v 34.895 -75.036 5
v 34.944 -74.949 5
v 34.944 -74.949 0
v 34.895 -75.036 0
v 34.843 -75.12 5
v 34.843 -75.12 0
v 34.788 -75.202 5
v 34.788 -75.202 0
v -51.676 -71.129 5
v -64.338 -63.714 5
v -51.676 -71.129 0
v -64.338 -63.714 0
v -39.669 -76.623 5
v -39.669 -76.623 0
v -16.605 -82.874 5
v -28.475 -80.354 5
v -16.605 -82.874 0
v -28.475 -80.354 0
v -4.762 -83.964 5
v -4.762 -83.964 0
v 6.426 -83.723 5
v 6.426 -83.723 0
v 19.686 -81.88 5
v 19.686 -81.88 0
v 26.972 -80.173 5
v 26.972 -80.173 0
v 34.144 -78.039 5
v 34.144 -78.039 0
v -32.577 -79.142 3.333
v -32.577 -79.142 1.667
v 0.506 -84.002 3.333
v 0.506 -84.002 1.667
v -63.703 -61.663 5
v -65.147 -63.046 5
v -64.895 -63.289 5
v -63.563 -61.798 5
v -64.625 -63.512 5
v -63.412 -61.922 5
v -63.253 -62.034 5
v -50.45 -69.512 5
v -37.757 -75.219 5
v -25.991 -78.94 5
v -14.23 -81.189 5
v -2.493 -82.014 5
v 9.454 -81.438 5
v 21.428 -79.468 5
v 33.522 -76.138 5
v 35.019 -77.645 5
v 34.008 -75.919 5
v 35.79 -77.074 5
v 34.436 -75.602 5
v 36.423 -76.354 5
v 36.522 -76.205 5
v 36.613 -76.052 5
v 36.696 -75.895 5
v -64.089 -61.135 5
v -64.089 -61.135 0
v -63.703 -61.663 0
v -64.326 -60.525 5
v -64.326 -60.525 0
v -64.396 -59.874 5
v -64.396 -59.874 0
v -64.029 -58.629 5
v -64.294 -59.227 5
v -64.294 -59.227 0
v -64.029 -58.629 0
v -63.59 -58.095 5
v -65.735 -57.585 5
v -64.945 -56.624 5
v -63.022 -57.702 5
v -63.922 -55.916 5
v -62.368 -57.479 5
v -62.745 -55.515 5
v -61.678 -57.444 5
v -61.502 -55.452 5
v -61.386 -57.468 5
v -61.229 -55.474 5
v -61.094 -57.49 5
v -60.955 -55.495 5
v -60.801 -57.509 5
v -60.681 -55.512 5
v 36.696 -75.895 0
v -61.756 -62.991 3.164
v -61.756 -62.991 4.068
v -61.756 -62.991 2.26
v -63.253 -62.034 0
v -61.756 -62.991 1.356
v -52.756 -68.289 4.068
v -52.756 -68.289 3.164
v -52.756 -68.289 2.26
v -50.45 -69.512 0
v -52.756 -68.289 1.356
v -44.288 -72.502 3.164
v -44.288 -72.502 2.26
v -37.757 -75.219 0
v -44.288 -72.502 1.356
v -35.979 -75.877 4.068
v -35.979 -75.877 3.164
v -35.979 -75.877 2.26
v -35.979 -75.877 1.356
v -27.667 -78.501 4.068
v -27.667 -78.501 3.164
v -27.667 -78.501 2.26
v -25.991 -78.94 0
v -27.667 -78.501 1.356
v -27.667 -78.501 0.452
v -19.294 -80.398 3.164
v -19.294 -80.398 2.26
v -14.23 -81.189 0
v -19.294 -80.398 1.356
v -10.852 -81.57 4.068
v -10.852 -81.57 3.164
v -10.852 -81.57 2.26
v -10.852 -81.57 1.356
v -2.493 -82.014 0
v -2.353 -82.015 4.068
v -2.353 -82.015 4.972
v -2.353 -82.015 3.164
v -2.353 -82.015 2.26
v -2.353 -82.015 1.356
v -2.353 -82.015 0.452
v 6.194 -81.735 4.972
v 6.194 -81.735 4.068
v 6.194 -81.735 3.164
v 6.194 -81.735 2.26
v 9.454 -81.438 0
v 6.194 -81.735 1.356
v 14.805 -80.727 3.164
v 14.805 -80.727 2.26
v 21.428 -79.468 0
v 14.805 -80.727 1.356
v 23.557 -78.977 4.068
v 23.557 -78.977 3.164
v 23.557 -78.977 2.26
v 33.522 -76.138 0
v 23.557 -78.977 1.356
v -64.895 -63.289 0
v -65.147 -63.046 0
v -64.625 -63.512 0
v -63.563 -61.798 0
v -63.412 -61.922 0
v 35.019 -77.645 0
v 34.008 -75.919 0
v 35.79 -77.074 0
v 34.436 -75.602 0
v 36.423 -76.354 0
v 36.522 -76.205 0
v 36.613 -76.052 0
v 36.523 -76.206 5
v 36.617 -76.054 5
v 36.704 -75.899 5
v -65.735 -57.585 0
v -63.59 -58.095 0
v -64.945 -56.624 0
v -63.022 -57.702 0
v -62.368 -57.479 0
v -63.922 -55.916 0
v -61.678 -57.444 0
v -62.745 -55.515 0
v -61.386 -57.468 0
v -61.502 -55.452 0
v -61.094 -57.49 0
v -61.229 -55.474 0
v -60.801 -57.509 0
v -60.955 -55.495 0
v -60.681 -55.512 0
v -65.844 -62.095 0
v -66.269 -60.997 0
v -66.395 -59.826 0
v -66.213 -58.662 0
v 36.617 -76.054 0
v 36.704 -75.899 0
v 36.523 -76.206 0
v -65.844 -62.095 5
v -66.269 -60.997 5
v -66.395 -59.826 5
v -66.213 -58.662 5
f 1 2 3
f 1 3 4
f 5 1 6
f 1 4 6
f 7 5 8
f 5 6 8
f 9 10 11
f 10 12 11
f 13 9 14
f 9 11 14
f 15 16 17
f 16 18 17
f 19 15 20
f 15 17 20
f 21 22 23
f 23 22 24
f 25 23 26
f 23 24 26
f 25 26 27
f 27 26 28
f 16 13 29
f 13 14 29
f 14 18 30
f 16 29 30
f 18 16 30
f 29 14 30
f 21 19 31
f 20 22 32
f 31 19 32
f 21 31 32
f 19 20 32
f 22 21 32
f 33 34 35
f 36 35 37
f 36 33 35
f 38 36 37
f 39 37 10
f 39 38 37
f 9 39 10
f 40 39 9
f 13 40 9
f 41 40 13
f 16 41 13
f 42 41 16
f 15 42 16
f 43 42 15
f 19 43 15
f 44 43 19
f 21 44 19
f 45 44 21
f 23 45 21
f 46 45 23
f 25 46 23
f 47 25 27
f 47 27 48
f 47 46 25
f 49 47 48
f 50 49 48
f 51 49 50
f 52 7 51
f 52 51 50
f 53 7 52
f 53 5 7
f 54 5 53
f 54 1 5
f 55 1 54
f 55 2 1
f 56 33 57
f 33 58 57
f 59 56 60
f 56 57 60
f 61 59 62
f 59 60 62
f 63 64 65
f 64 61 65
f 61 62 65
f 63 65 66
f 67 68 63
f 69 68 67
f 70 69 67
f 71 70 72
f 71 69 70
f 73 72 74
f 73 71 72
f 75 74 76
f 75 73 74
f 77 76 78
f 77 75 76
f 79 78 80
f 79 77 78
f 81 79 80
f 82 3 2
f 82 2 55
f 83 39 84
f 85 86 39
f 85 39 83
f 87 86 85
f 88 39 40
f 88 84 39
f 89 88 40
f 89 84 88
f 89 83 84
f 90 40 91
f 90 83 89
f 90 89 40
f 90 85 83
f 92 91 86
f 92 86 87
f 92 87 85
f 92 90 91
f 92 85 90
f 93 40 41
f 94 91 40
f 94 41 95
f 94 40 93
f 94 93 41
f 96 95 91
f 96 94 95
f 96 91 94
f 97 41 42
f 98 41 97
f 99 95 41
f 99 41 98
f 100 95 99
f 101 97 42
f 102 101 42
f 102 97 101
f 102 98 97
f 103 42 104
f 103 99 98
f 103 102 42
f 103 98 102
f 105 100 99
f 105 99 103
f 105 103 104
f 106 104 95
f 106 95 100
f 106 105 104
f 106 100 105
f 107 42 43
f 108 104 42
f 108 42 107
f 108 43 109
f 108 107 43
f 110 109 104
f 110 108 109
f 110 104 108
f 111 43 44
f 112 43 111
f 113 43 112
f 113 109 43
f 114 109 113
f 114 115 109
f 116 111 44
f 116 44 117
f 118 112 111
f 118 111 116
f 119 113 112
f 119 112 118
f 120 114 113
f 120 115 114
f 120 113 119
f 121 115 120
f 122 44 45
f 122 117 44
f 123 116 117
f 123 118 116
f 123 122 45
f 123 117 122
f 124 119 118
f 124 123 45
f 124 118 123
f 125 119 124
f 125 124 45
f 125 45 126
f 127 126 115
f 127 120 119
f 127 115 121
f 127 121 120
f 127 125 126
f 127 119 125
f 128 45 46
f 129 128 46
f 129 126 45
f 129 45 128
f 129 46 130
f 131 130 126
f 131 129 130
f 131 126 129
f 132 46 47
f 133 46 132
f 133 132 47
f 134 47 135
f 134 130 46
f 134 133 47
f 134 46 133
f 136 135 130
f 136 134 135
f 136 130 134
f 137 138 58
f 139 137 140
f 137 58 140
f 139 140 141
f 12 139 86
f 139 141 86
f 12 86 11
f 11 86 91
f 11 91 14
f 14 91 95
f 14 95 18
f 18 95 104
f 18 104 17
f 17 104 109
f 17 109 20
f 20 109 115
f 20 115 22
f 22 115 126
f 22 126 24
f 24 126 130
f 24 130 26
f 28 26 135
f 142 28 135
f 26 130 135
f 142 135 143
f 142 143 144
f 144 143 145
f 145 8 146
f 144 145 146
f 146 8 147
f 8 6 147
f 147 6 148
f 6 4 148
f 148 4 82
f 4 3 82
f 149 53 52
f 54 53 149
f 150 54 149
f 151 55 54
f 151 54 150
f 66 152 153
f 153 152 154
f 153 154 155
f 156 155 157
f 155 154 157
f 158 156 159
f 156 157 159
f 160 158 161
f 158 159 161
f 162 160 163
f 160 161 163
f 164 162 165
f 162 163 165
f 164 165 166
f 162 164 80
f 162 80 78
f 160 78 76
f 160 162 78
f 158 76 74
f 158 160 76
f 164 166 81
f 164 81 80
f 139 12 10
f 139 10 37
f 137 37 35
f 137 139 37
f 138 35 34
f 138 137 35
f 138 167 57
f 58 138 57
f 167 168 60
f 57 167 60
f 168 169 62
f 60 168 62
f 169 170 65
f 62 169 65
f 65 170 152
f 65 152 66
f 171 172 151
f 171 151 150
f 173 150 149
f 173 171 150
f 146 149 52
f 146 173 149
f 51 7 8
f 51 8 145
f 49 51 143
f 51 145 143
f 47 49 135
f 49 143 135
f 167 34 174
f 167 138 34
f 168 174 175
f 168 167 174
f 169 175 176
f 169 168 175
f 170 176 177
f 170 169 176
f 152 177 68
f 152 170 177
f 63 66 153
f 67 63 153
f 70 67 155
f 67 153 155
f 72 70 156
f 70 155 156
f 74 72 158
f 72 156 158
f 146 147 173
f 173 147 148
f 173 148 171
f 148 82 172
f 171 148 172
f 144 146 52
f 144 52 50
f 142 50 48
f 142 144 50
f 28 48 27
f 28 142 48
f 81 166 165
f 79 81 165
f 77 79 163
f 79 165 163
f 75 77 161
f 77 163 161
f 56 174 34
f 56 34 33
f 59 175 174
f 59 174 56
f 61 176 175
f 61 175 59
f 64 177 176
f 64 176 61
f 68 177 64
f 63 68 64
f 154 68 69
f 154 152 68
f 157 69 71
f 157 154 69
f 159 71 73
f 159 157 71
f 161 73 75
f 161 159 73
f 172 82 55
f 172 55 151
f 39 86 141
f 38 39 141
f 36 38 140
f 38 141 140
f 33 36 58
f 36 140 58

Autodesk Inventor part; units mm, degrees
ref_plane "YZ Plane" through (0, 0, 0) normal (1, 0, 0) x (0, 1, 0)
ref_plane "XZ Plane" through (0, 0, 0) normal (0, 1, 0) x (-1, 0, 0)
ref_plane "XY Plane" through (0, 0, 0) normal (0, 0, 1) x (1, 0, 0)
sketch "スケッチ1" plane through (0, 0, 0) normal (0, 0, 1) x (1, 0, 0)
  circle A0 centre (0, -30) radius 22.5
  arc A1 (33.5221, -76.1381) -> (34.7879, -75.2018) centre (32.744, -73.7622) ccw
  arc A2 (25.323, -41.3574) -> (34.2025, -71.7318) centre (49.1917, -50.8648) ccw
  arc A3 (25.323, -41.3574) -> (17.6049, -10.4152) centre (-0.0473, -31.252) ccw
  arc A4 (17.6049, -10.4152) -> (7.2408, -4.7162) centre (-0.2944, -30.6931) ccw
  arc A5 (5.1078, -1.4883) -> (7.2408, -4.7162) centre (8.0549, -1.8596) ccw
  arc A6 (5.1078, -1.4883) -> (-5.8369, -1.4852) centre (-0.3643, -0.7018) ccw
  arc A7 (-5.8369, -1.4852) -> (-5.7215, -2.051) centre (-0.3936, -0.6703) ccw
  arc A8 (-7.4636, -3.4089) -> (-5.7215, -2.051) centre (-8.3074, -0.53) ccw
  arc A9 (-7.4636, -3.4089) -> (-26.8108, -27.5489) centre (0.1311, -29.3188) ccw
  arc A10 (-61.6776, -57.4439) -> (-26.8108, -27.5489) centre (-58.8657, -25.4432) ccw
  arc A11 (-61.6776, -57.4439) -> (-63.2531, -62.0341) centre (-61.8964, -59.9343) ccw
  spline S0 degree 4 poles (-63.2531, -62.0341) (-62.8771, -62.2771) (-62.3536, -62.6129) (-61.6848, -63.0378) (-60.873, -63.5467) (-60.2895, -63.9093) (-59.7104, -64.266) (-59.1355, -64.6169) (-58.5645, -64.9622) (-57.9972, -65.3021) (-57.4335, -65.6368) (-56.873, -65.9663) (-56.3156, -66.2909) (-55.7612, -66.6107) (-55.2095, -66.9258) (-54.6604, -67.2364) (-54.1137, -67.5424) (-53.5693, -67.8442) (-53.027, -68.1416) (-52.4867, -68.4349) (-51.9483, -68.7242) (-51.4116, -69.0094) (-50.8766, -69.2907) (-50.3432, -69.5682) (-49.8111, -69.8419) (-49.2804, -70.1119) (-48.7509, -70.3783) (-48.2225, -70.6411) (-47.6953, -70.9003) (-47.169, -71.156) (-46.6436, -71.4083) (-46.119, -71.6572) (-45.5953, -71.9028) (-45.0722, -72.145) (-44.5498, -72.384) (-44.0279, -72.6197) (-43.5066, -72.8522) (-42.9857, -73.0816) (-42.4653, -73.3077) (-41.9453, -73.5308) (-41.4255, -73.7507) (-40.9061, -73.9676) (-40.3869, -74.1814) (-39.868, -74.3922) (-39.3492, -74.5999) (-38.8305, -74.8047) (-38.312, -75.0064) (-37.7935, -75.2052) (-37.2751, -75.401) (-36.7567, -75.5939) (-36.2383, -75.7839) (-35.7198, -75.9709) (-35.2014, -76.155) (-34.6828, -76.3362) (-34.1642, -76.5146) (-33.6454, -76.69) (-33.1265, -76.8625) (-32.6075, -77.0322) (-32.0883, -77.199) (-31.5689, -77.363) (-31.0494, -77.5241) (-30.5297, -77.6823) (-30.0097, -77.8377) (-29.4895, -77.9902) (-28.9692, -78.1399) (-28.4485, -78.2868) (-27.9276, -78.4308) (-27.4065, -78.572) (-26.8851, -78.7103) (-26.3635, -78.8459) (-25.8416, -78.9785) (-25.3194, -79.1084) (-24.797, -79.2354) (-24.2743, -79.3596) (-23.7513, -79.481) (-23.228, -79.5995) (-22.7044, -79.7153) (-22.1806, -79.8281) (-21.6564, -79.9382) (-21.132, -80.0454) (-20.6073, -80.1498) (-20.0824, -80.2514) (-19.5571, -80.3501) (-19.0316, -80.446) (-18.5058, -80.5391) (-17.9797, -80.6294) (-17.4533, -80.7168) (-16.9267, -80.8014) (-16.3998, -80.8831) (-15.8727, -80.962) (-15.3453, -81.0381) (-14.8176, -81.1114) (-14.2897, -81.1818) (-13.7615, -81.2494) (-13.2331, -81.3141) (-12.7045, -81.376) (-12.1756, -81.4351) (-11.6464, -81.4913) (-11.1171, -81.5447) (-10.5875, -81.5953) (-10.0577, -81.643) (-9.5277, -81.6879) (-8.9975, -81.7299) (-8.467, -81.7691) (-7.9364, -81.8055) (-7.4055, -81.839) (-6.8745, -81.8697) (-6.3432, -81.8975) (-5.8118, -81.9225) (-5.2802, -81.9447) (-4.7483, -81.964) (-4.2163, -81.9805) (-3.6842, -81.9941) (-3.1518, -82.005) (-2.6192, -82.0129) (-2.0865, -82.0181) (-1.5536, -82.0204) (-1.0205, -82.0198) (-0.4873, -82.0165) (0.0461, -82.0103) (0.5798, -82.0012) (1.1136, -81.9893) (1.6475, -81.9746) (2.1817, -81.9571) (2.716, -81.9367) (3.2506, -81.9135) (3.7853, -81.8874) (4.3203, -81.8585) (4.8554, -81.8268) (5.3907, -81.7923) (5.9263, -81.7549) (6.4621, -81.7146) (6.9982, -81.6716) (7.5345, -81.6257) (8.071, -81.5769) (8.6078, -81.5254) (9.1449, -81.4709) (9.6823, -81.4137) (10.22, -81.3536) (10.758, -81.2906) (11.2964, -81.2248) (11.8351, -81.1561) (12.3742, -81.0846) (12.9137, -81.0102) (13.4537, -80.933) (13.9941, -80.8528) (14.5349, -80.7698) (15.0763, -80.6839) (15.6182, -80.5952) (16.1606, -80.5035) (16.7036, -80.4089) (17.2473, -80.3114) (17.7916, -80.211) (18.3366, -80.1077) (18.8824, -80.0014) (19.4289, -79.8921) (19.9763, -79.7799) (20.5245, -79.6647) (21.0736, -79.5465) (21.6238, -79.4253) (22.1749, -79.301) (22.7271, -79.1737) (23.2805, -79.0433) (23.835, -78.9099) (24.3908, -78.7733) (24.948, -78.6336) (25.5066, -78.4907) (26.0666, -78.3446) (26.6283, -78.1953) (27.1915, -78.0427) (27.7565, -77.8868) (28.3233, -77.7276) (28.8921, -77.5651) (29.4629, -77.3991) (30.0358, -77.2297) (30.6109, -77.0568) (31.1884, -76.8803) (31.9873, -76.6323) (32.6434, -76.4238) (33.1553, -76.2582) (33.5221, -76.1381) knots 0 0 0 0 0 0.015592 0.021777 0.027929 0.034049 0.040138 0.046199 0.052232 0.058238 0.064219 0.070176 0.076109 0.08202 0.08791 0.093779 0.099629 0.105459 0.111272 0.117067 0.122846 0.128609 0.134356 0.140089 0.145808 0.151513 0.157206 0.162886 0.168554 0.17421 0.179856 0.185491 0.191116 0.196731 0.202337 0.207934 0.213522 0.219102 0.224675 0.230239 0.235796 0.241346 0.246889 0.252426 0.257957 0.263481 0.269 0.274513 0.280021 0.285523 0.291021 0.296514 0.302002 0.307486 0.312966 0.318442 0.323914 0.329382 0.334846 0.340307 0.345765 0.351219 0.356671 0.362119 0.367565 0.373008 0.378448 0.383886 0.389321 0.394754 0.400185 0.405614 0.41104 0.416465 0.421888 0.427309 0.432729 0.438147 0.443563 0.448978 0.454391 0.459803 0.465214 0.470624 0.476032 0.48144 0.486846 0.492252 0.497656 0.50306 0.508463 0.513865 0.519267 0.524668 0.530069 0.535469 0.540869 0.546268 0.551667 0.557066 0.562465 0.567863 0.573262 0.57866 0.584059 0.589457 0.594856 0.600255 0.605655 0.611054 0.616454 0.621855 0.627256 0.632658 0.63806 0.643464 0.648868 0.654273 0.659678 0.665086 0.670494 0.675903 0.681314 0.686726 0.69214 0.697555 0.702972 0.708391 0.713811 0.719234 0.724659 0.730086 0.735515 0.740947 0.746382 0.751819 0.757259 0.762702 0.768149 0.773599 0.779052 0.784509 0.789969 0.795434 0.800903 0.806376 0.811854 0.817337 0.822825 0.828317 0.833816 0.83932 0.84483 0.850346 0.855869 0.861399 0.866935 0.872479 0.878031 0.883591 0.889159 0.894736 0.900321 0.905917 0.911522 0.917137 0.922763 0.9284 0.934049 0.93971 0.945383 0.951069 0.956769 0.962483 0.968212 0.973956 0.979716 0.985493 1 1 1 1 1
  arc A12 (34.1445, -78.0387) -> (35.3693, -70.1074) centre (32.744, -73.7622) ccw
  arc A13 (27.181, -42.0975) -> (35.3693, -70.1074) centre (49.1917, -50.8648) ccw
  arc A14 (27.181, -42.0975) -> (18.9132, -8.9024) centre (-0.0473, -31.252) ccw
  arc A15 (18.9132, -8.9024) -> (7.7922, -2.7937) centre (-0.2944, -30.6931) ccw
  arc A16 (7.0908, -1.7497) -> (7.7922, -2.7937) centre (8.0549, -1.8596) ccw
  arc A17 (7.0908, -1.7497) -> (-7.8158, -1.7749) centre (-0.3643, -0.7018) ccw
  arc A18 (-7.8158, -1.7749) -> (-7.8596, -1.4241) centre (-0.3936, -0.6703) ccw
  arc A19 (-8.0261, -1.4896) -> (-7.8596, -1.4241) centre (-8.3074, -0.53) ccw
  arc A20 (-8.0261, -1.4896) -> (-28.8065, -27.4178) centre (0.1311, -29.3188) ccw
  arc A21 (-61.5025, -55.4515) -> (-28.8065, -27.4178) centre (-58.8657, -25.4432) ccw
  arc A22 (-61.5025, -55.4515) -> (-64.3384, -63.714) centre (-61.8964, -59.9343) ccw
  line L0 (32.744, -73.7622) -> (36.7043, -75.899)
  line L1 (-58.8657, -25.4432) -> (-60.8013, -57.5088)
  line L2 (-61.8964, -59.9343) -> (-65.1475, -63.0456)
  line L3 (-61.8964, -59.9343) -> (-65.7346, -57.5851)
  line L4 (49.1917, -50.8648) -> (30.5824, -70.5938)
  arc A23 (-5.8375, -1.4811) -> (-5.8362, -1.4893) centre (-4.7979, -1.3331) ccw
  arc A24 (-5.8362, -1.4893) -> (-5.8121, -1.6365) centre (-0.3936, -0.6703) ccw
  arc A25 (-6.0587, -2.5158) -> (-5.8121, -1.6365) centre (-6.8458, -1.8208) ccw
  arc A26 (-7.4636, -3.4089) -> (-6.0587, -2.5158) centre (-8.3074, -0.53) ccw
  arc A27 (-7.4636, -3.4089) -> (-26.8108, -27.5489) centre (0.1311, -29.3188) ccw
  arc A28 (-61.6776, -57.4439) -> (-26.8108, -27.5489) centre (-58.8657, -25.4432) ccw
  arc A29 (-61.6776, -57.4439) -> (-63.2531, -62.0341) centre (-61.8964, -59.9343) ccw
  spline S1 degree 4 poles (-63.2531, -62.0341) (-62.8771, -62.2771) (-62.3536, -62.6129) (-61.6848, -63.0378) (-60.873, -63.5467) (-60.2895, -63.9093) (-59.7104, -64.266) (-59.1355, -64.6169) (-58.5645, -64.9622) (-57.9972, -65.3021) (-57.4335, -65.6368) (-56.873, -65.9663) (-56.3156, -66.2909) (-55.7612, -66.6107) (-55.2095, -66.9258) (-54.6604, -67.2364) (-54.1137, -67.5424) (-53.5693, -67.8442) (-53.027, -68.1416) (-52.4867, -68.4349) (-51.9483, -68.7242) (-51.4116, -69.0094) (-50.8766, -69.2907) (-50.3432, -69.5682) (-49.8111, -69.8419) (-49.2804, -70.1119) (-48.7509, -70.3783) (-48.2225, -70.6411) (-47.6953, -70.9003) (-47.169, -71.156) (-46.6436, -71.4083) (-46.119, -71.6572) (-45.5953, -71.9028) (-45.0722, -72.145) (-44.5498, -72.384) (-44.0279, -72.6197) (-43.5066, -72.8522) (-42.9857, -73.0816) (-42.4653, -73.3077) (-41.9453, -73.5308) (-41.4255, -73.7507) (-40.9061, -73.9676) (-40.3869, -74.1814) (-39.868, -74.3922) (-39.3492, -74.5999) (-38.8305, -74.8047) (-38.312, -75.0064) (-37.7935, -75.2052) (-37.2751, -75.401) (-36.7567, -75.5939) (-36.2383, -75.7839) (-35.7198, -75.9709) (-35.2014, -76.155) (-34.6828, -76.3362) (-34.1642, -76.5146) (-33.6454, -76.69) (-33.1265, -76.8625) (-32.6075, -77.0322) (-32.0883, -77.199) (-31.5689, -77.363) (-31.0494, -77.5241) (-30.5297, -77.6823) (-30.0097, -77.8377) (-29.4895, -77.9902) (-28.9692, -78.1399) (-28.4485, -78.2868) (-27.9276, -78.4308) (-27.4065, -78.572) (-26.8851, -78.7103) (-26.3635, -78.8459) (-25.8416, -78.9785) (-25.3194, -79.1084) (-24.797, -79.2354) (-24.2743, -79.3596) (-23.7513, -79.481) (-23.228, -79.5995) (-22.7044, -79.7153) (-22.1806, -79.8281) (-21.6564, -79.9382) (-21.132, -80.0454) (-20.6073, -80.1498) (-20.0824, -80.2514) (-19.5571, -80.3501) (-19.0316, -80.446) (-18.5058, -80.5391) (-17.9797, -80.6294) (-17.4533, -80.7168) (-16.9267, -80.8014) (-16.3998, -80.8831) (-15.8727, -80.962) (-15.3453, -81.0381) (-14.8176, -81.1114) (-14.2897, -81.1818) (-13.7615, -81.2494) (-13.2331, -81.3141) (-12.7045, -81.376) (-12.1756, -81.4351) (-11.6464, -81.4913) (-11.1171, -81.5447) (-10.5875, -81.5953) (-10.0577, -81.643) (-9.5277, -81.6879) (-8.9975, -81.7299) (-8.467, -81.7691) (-7.9364, -81.8055) (-7.4055, -81.839) (-6.8745, -81.8697) (-6.3432, -81.8975) (-5.8118, -81.9225) (-5.2802, -81.9447) (-4.7483, -81.964) (-4.2163, -81.9805) (-3.6842, -81.9941) (-3.1518, -82.005) (-2.6192, -82.0129) (-2.0865, -82.0181) (-1.5536, -82.0204) (-1.0205, -82.0198) (-0.4873, -82.0165) (0.0461, -82.0103) (0.5798, -82.0012) (1.1136, -81.9893) (1.6475, -81.9746) (2.1817, -81.9571) (2.716, -81.9367) (3.2506, -81.9135) (3.7853, -81.8874) (4.3203, -81.8585) (4.8554, -81.8268) (5.3907, -81.7923) (5.9263, -81.7549) (6.4621, -81.7146) (6.9982, -81.6716) (7.5345, -81.6257) (8.071, -81.5769) (8.6078, -81.5254) (9.1449, -81.4709) (9.6823, -81.4137) (10.22, -81.3536) (10.758, -81.2906) (11.2964, -81.2248) (11.8351, -81.1561) (12.3742, -81.0846) (12.9137, -81.0102) (13.4537, -80.933) (13.9941, -80.8528) (14.5349, -80.7698) (15.0763, -80.6839) (15.6182, -80.5952) (16.1606, -80.5035) (16.7036, -80.4089) (17.2473, -80.3114) (17.7916, -80.211) (18.3366, -80.1077) (18.8824, -80.0014) (19.4289, -79.8921) (19.9763, -79.7799) (20.5245, -79.6647) (21.0736, -79.5465) (21.6238, -79.4253) (22.1749, -79.301) (22.7271, -79.1737) (23.2805, -79.0433) (23.835, -78.9099) (24.3908, -78.7733) (24.948, -78.6336) (25.5066, -78.4907) (26.0666, -78.3446) (26.6283, -78.1953) (27.1915, -78.0427) (27.7565, -77.8868) (28.3233, -77.7276) (28.8921, -77.5651) (29.4629, -77.3991) (30.0358, -77.2297) (30.6109, -77.0568) (31.1884, -76.8803) (31.9873, -76.6323) (32.6434, -76.4238) (33.1553, -76.2582) (33.5221, -76.1381) knots 0 0 0 0 0 0.015592 0.021777 0.027929 0.034049 0.040138 0.046199 0.052232 0.058238 0.064219 0.070176 0.076109 0.08202 0.08791 0.093779 0.099629 0.105459 0.111272 0.117067 0.122846 0.128609 0.134356 0.140089 0.145808 0.151513 0.157206 0.162886 0.168554 0.17421 0.179856 0.185491 0.191116 0.196731 0.202337 0.207934 0.213522 0.219102 0.224675 0.230239 0.235796 0.241346 0.246889 0.252426 0.257957 0.263481 0.269 0.274513 0.280021 0.285523 0.291021 0.296514 0.302002 0.307486 0.312966 0.318442 0.323914 0.329382 0.334846 0.340307 0.345765 0.351219 0.356671 0.362119 0.367565 0.373008 0.378448 0.383886 0.389321 0.394754 0.400185 0.405614 0.41104 0.416465 0.421888 0.427309 0.432729 0.438147 0.443563 0.448978 0.454391 0.459803 0.465214 0.470624 0.476032 0.48144 0.486846 0.492252 0.497656 0.50306 0.508463 0.513865 0.519267 0.524668 0.530069 0.535469 0.540869 0.546268 0.551667 0.557066 0.562465 0.567863 0.573262 0.57866 0.584059 0.589457 0.594856 0.600255 0.605655 0.611054 0.616454 0.621855 0.627256 0.632658 0.63806 0.643464 0.648868 0.654273 0.659678 0.665086 0.670494 0.675903 0.681314 0.686726 0.69214 0.697555 0.702972 0.708391 0.713811 0.719234 0.724659 0.730086 0.735515 0.740947 0.746382 0.751819 0.757259 0.762702 0.768149 0.773599 0.779052 0.784509 0.789969 0.795434 0.800903 0.806376 0.811854 0.817337 0.822825 0.828317 0.833816 0.83932 0.84483 0.850346 0.855869 0.861399 0.866935 0.872479 0.878031 0.883591 0.889159 0.894736 0.900321 0.905917 0.911522 0.917137 0.922763 0.9284 0.934049 0.93971 0.945383 0.951069 0.956769 0.962483 0.968212 0.973956 0.979716 0.985493 1 1 1 1 1
  arc A30 (33.5221, -76.1381) -> (34.7879, -75.2018) centre (32.744, -73.7622) ccw
  arc A31 (34.7879, -75.2018) -> (34.2598, -73.0105) centre (33.5615, -74.3381) ccw
  arc A32 (25.323, -41.3574) -> (30.5824, -70.5938) centre (44.8156, -52.9421) ccw
  arc A33 (25.323, -41.3574) -> (17.6049, -10.4152) centre (-0.0473, -31.252) ccw
  arc A34 (17.6049, -10.4152) -> (7.2408, -4.7162) centre (-0.2944, -30.6931) ccw
  arc A35 (5.1078, -1.4883) -> (7.2408, -4.7162) centre (8.0549, -1.8596) ccw
  arc A36 (5.1078, -1.4883) -> (-5.8375, -1.4811) centre (-0.3643, -0.7018) ccw
  circle A37 centre (0, -30) radius 22.7
  arc A38 (30.5824, -70.5938) -> (34.2598, -73.0105) centre (44.8156, -52.9421) ccw
  arc A39 (34.7879, -75.2018) -> (34.2025, -71.7318) centre (32.744, -73.7622) ccw
  arc A40 (31.8378, -69.0369) -> (35.1909, -71.2404) centre (44.8156, -52.9421) ccw
  arc A41 (36.423, -76.3535) -> (35.1909, -71.2404) centre (33.5615, -74.3381) ccw
  spline S2 degree 5 poles (-64.3384, -63.714) (-58.3884, -67.5577) (-52.2614, -71.1261) (-45.9065, -74.3086) (-33.0908, -79.5522) (-19.6141, -82.7098) (-12.9369, -83.7013) (0.6571, -84.5608) (14.2099, -83.176) (20.9822, -81.9204) (27.6266, -80.1731) (34.1445, -78.0387) knots 0 0 0 0 0 0 0.342867 0.342867 0.342867 0.668023 0.668023 0.668023 1 1 1 1 1 1
  point P0 (0, 0)
  point P1 (0, 0)
  point P2 (34.9441, -74.9493)
  point P3 (-60.6808, -55.5124)
  point P4 (-63.7026, -61.6628)
  point P5 (-64.0288, -58.6292)
  point P6 (32.9348, -68.0999)
  point P7 (0, 0)
  point P8 (-5.8121, -1.6365)
  point P9 (25.323, -41.3574)
  point P10 (-5.8121, -1.6365)
  point P11 (34.9441, -74.9493)
  point P12 (-63.7026, -61.6628)
  point P13 (25.323, -41.3574)
  point P14 (36.6963, -75.8947)
  point P15 (31.9593, -69.1341)
  point P16 (34.9338, -74.9438)
  dimension "d0" = 2
  dimension "d3" = 2
extrude "押し出し1" add sketch "スケッチ1" along normal blind 5 contours A10 A11 L3 A22 A21 L1 | A11 L2 A22 L3 | L0 A41 A12 S2 A22 L2 A11 S0 A1 A39 | L0 A12 A41
properties part number "脚ゴム" material "ゴム、シリコーン"
